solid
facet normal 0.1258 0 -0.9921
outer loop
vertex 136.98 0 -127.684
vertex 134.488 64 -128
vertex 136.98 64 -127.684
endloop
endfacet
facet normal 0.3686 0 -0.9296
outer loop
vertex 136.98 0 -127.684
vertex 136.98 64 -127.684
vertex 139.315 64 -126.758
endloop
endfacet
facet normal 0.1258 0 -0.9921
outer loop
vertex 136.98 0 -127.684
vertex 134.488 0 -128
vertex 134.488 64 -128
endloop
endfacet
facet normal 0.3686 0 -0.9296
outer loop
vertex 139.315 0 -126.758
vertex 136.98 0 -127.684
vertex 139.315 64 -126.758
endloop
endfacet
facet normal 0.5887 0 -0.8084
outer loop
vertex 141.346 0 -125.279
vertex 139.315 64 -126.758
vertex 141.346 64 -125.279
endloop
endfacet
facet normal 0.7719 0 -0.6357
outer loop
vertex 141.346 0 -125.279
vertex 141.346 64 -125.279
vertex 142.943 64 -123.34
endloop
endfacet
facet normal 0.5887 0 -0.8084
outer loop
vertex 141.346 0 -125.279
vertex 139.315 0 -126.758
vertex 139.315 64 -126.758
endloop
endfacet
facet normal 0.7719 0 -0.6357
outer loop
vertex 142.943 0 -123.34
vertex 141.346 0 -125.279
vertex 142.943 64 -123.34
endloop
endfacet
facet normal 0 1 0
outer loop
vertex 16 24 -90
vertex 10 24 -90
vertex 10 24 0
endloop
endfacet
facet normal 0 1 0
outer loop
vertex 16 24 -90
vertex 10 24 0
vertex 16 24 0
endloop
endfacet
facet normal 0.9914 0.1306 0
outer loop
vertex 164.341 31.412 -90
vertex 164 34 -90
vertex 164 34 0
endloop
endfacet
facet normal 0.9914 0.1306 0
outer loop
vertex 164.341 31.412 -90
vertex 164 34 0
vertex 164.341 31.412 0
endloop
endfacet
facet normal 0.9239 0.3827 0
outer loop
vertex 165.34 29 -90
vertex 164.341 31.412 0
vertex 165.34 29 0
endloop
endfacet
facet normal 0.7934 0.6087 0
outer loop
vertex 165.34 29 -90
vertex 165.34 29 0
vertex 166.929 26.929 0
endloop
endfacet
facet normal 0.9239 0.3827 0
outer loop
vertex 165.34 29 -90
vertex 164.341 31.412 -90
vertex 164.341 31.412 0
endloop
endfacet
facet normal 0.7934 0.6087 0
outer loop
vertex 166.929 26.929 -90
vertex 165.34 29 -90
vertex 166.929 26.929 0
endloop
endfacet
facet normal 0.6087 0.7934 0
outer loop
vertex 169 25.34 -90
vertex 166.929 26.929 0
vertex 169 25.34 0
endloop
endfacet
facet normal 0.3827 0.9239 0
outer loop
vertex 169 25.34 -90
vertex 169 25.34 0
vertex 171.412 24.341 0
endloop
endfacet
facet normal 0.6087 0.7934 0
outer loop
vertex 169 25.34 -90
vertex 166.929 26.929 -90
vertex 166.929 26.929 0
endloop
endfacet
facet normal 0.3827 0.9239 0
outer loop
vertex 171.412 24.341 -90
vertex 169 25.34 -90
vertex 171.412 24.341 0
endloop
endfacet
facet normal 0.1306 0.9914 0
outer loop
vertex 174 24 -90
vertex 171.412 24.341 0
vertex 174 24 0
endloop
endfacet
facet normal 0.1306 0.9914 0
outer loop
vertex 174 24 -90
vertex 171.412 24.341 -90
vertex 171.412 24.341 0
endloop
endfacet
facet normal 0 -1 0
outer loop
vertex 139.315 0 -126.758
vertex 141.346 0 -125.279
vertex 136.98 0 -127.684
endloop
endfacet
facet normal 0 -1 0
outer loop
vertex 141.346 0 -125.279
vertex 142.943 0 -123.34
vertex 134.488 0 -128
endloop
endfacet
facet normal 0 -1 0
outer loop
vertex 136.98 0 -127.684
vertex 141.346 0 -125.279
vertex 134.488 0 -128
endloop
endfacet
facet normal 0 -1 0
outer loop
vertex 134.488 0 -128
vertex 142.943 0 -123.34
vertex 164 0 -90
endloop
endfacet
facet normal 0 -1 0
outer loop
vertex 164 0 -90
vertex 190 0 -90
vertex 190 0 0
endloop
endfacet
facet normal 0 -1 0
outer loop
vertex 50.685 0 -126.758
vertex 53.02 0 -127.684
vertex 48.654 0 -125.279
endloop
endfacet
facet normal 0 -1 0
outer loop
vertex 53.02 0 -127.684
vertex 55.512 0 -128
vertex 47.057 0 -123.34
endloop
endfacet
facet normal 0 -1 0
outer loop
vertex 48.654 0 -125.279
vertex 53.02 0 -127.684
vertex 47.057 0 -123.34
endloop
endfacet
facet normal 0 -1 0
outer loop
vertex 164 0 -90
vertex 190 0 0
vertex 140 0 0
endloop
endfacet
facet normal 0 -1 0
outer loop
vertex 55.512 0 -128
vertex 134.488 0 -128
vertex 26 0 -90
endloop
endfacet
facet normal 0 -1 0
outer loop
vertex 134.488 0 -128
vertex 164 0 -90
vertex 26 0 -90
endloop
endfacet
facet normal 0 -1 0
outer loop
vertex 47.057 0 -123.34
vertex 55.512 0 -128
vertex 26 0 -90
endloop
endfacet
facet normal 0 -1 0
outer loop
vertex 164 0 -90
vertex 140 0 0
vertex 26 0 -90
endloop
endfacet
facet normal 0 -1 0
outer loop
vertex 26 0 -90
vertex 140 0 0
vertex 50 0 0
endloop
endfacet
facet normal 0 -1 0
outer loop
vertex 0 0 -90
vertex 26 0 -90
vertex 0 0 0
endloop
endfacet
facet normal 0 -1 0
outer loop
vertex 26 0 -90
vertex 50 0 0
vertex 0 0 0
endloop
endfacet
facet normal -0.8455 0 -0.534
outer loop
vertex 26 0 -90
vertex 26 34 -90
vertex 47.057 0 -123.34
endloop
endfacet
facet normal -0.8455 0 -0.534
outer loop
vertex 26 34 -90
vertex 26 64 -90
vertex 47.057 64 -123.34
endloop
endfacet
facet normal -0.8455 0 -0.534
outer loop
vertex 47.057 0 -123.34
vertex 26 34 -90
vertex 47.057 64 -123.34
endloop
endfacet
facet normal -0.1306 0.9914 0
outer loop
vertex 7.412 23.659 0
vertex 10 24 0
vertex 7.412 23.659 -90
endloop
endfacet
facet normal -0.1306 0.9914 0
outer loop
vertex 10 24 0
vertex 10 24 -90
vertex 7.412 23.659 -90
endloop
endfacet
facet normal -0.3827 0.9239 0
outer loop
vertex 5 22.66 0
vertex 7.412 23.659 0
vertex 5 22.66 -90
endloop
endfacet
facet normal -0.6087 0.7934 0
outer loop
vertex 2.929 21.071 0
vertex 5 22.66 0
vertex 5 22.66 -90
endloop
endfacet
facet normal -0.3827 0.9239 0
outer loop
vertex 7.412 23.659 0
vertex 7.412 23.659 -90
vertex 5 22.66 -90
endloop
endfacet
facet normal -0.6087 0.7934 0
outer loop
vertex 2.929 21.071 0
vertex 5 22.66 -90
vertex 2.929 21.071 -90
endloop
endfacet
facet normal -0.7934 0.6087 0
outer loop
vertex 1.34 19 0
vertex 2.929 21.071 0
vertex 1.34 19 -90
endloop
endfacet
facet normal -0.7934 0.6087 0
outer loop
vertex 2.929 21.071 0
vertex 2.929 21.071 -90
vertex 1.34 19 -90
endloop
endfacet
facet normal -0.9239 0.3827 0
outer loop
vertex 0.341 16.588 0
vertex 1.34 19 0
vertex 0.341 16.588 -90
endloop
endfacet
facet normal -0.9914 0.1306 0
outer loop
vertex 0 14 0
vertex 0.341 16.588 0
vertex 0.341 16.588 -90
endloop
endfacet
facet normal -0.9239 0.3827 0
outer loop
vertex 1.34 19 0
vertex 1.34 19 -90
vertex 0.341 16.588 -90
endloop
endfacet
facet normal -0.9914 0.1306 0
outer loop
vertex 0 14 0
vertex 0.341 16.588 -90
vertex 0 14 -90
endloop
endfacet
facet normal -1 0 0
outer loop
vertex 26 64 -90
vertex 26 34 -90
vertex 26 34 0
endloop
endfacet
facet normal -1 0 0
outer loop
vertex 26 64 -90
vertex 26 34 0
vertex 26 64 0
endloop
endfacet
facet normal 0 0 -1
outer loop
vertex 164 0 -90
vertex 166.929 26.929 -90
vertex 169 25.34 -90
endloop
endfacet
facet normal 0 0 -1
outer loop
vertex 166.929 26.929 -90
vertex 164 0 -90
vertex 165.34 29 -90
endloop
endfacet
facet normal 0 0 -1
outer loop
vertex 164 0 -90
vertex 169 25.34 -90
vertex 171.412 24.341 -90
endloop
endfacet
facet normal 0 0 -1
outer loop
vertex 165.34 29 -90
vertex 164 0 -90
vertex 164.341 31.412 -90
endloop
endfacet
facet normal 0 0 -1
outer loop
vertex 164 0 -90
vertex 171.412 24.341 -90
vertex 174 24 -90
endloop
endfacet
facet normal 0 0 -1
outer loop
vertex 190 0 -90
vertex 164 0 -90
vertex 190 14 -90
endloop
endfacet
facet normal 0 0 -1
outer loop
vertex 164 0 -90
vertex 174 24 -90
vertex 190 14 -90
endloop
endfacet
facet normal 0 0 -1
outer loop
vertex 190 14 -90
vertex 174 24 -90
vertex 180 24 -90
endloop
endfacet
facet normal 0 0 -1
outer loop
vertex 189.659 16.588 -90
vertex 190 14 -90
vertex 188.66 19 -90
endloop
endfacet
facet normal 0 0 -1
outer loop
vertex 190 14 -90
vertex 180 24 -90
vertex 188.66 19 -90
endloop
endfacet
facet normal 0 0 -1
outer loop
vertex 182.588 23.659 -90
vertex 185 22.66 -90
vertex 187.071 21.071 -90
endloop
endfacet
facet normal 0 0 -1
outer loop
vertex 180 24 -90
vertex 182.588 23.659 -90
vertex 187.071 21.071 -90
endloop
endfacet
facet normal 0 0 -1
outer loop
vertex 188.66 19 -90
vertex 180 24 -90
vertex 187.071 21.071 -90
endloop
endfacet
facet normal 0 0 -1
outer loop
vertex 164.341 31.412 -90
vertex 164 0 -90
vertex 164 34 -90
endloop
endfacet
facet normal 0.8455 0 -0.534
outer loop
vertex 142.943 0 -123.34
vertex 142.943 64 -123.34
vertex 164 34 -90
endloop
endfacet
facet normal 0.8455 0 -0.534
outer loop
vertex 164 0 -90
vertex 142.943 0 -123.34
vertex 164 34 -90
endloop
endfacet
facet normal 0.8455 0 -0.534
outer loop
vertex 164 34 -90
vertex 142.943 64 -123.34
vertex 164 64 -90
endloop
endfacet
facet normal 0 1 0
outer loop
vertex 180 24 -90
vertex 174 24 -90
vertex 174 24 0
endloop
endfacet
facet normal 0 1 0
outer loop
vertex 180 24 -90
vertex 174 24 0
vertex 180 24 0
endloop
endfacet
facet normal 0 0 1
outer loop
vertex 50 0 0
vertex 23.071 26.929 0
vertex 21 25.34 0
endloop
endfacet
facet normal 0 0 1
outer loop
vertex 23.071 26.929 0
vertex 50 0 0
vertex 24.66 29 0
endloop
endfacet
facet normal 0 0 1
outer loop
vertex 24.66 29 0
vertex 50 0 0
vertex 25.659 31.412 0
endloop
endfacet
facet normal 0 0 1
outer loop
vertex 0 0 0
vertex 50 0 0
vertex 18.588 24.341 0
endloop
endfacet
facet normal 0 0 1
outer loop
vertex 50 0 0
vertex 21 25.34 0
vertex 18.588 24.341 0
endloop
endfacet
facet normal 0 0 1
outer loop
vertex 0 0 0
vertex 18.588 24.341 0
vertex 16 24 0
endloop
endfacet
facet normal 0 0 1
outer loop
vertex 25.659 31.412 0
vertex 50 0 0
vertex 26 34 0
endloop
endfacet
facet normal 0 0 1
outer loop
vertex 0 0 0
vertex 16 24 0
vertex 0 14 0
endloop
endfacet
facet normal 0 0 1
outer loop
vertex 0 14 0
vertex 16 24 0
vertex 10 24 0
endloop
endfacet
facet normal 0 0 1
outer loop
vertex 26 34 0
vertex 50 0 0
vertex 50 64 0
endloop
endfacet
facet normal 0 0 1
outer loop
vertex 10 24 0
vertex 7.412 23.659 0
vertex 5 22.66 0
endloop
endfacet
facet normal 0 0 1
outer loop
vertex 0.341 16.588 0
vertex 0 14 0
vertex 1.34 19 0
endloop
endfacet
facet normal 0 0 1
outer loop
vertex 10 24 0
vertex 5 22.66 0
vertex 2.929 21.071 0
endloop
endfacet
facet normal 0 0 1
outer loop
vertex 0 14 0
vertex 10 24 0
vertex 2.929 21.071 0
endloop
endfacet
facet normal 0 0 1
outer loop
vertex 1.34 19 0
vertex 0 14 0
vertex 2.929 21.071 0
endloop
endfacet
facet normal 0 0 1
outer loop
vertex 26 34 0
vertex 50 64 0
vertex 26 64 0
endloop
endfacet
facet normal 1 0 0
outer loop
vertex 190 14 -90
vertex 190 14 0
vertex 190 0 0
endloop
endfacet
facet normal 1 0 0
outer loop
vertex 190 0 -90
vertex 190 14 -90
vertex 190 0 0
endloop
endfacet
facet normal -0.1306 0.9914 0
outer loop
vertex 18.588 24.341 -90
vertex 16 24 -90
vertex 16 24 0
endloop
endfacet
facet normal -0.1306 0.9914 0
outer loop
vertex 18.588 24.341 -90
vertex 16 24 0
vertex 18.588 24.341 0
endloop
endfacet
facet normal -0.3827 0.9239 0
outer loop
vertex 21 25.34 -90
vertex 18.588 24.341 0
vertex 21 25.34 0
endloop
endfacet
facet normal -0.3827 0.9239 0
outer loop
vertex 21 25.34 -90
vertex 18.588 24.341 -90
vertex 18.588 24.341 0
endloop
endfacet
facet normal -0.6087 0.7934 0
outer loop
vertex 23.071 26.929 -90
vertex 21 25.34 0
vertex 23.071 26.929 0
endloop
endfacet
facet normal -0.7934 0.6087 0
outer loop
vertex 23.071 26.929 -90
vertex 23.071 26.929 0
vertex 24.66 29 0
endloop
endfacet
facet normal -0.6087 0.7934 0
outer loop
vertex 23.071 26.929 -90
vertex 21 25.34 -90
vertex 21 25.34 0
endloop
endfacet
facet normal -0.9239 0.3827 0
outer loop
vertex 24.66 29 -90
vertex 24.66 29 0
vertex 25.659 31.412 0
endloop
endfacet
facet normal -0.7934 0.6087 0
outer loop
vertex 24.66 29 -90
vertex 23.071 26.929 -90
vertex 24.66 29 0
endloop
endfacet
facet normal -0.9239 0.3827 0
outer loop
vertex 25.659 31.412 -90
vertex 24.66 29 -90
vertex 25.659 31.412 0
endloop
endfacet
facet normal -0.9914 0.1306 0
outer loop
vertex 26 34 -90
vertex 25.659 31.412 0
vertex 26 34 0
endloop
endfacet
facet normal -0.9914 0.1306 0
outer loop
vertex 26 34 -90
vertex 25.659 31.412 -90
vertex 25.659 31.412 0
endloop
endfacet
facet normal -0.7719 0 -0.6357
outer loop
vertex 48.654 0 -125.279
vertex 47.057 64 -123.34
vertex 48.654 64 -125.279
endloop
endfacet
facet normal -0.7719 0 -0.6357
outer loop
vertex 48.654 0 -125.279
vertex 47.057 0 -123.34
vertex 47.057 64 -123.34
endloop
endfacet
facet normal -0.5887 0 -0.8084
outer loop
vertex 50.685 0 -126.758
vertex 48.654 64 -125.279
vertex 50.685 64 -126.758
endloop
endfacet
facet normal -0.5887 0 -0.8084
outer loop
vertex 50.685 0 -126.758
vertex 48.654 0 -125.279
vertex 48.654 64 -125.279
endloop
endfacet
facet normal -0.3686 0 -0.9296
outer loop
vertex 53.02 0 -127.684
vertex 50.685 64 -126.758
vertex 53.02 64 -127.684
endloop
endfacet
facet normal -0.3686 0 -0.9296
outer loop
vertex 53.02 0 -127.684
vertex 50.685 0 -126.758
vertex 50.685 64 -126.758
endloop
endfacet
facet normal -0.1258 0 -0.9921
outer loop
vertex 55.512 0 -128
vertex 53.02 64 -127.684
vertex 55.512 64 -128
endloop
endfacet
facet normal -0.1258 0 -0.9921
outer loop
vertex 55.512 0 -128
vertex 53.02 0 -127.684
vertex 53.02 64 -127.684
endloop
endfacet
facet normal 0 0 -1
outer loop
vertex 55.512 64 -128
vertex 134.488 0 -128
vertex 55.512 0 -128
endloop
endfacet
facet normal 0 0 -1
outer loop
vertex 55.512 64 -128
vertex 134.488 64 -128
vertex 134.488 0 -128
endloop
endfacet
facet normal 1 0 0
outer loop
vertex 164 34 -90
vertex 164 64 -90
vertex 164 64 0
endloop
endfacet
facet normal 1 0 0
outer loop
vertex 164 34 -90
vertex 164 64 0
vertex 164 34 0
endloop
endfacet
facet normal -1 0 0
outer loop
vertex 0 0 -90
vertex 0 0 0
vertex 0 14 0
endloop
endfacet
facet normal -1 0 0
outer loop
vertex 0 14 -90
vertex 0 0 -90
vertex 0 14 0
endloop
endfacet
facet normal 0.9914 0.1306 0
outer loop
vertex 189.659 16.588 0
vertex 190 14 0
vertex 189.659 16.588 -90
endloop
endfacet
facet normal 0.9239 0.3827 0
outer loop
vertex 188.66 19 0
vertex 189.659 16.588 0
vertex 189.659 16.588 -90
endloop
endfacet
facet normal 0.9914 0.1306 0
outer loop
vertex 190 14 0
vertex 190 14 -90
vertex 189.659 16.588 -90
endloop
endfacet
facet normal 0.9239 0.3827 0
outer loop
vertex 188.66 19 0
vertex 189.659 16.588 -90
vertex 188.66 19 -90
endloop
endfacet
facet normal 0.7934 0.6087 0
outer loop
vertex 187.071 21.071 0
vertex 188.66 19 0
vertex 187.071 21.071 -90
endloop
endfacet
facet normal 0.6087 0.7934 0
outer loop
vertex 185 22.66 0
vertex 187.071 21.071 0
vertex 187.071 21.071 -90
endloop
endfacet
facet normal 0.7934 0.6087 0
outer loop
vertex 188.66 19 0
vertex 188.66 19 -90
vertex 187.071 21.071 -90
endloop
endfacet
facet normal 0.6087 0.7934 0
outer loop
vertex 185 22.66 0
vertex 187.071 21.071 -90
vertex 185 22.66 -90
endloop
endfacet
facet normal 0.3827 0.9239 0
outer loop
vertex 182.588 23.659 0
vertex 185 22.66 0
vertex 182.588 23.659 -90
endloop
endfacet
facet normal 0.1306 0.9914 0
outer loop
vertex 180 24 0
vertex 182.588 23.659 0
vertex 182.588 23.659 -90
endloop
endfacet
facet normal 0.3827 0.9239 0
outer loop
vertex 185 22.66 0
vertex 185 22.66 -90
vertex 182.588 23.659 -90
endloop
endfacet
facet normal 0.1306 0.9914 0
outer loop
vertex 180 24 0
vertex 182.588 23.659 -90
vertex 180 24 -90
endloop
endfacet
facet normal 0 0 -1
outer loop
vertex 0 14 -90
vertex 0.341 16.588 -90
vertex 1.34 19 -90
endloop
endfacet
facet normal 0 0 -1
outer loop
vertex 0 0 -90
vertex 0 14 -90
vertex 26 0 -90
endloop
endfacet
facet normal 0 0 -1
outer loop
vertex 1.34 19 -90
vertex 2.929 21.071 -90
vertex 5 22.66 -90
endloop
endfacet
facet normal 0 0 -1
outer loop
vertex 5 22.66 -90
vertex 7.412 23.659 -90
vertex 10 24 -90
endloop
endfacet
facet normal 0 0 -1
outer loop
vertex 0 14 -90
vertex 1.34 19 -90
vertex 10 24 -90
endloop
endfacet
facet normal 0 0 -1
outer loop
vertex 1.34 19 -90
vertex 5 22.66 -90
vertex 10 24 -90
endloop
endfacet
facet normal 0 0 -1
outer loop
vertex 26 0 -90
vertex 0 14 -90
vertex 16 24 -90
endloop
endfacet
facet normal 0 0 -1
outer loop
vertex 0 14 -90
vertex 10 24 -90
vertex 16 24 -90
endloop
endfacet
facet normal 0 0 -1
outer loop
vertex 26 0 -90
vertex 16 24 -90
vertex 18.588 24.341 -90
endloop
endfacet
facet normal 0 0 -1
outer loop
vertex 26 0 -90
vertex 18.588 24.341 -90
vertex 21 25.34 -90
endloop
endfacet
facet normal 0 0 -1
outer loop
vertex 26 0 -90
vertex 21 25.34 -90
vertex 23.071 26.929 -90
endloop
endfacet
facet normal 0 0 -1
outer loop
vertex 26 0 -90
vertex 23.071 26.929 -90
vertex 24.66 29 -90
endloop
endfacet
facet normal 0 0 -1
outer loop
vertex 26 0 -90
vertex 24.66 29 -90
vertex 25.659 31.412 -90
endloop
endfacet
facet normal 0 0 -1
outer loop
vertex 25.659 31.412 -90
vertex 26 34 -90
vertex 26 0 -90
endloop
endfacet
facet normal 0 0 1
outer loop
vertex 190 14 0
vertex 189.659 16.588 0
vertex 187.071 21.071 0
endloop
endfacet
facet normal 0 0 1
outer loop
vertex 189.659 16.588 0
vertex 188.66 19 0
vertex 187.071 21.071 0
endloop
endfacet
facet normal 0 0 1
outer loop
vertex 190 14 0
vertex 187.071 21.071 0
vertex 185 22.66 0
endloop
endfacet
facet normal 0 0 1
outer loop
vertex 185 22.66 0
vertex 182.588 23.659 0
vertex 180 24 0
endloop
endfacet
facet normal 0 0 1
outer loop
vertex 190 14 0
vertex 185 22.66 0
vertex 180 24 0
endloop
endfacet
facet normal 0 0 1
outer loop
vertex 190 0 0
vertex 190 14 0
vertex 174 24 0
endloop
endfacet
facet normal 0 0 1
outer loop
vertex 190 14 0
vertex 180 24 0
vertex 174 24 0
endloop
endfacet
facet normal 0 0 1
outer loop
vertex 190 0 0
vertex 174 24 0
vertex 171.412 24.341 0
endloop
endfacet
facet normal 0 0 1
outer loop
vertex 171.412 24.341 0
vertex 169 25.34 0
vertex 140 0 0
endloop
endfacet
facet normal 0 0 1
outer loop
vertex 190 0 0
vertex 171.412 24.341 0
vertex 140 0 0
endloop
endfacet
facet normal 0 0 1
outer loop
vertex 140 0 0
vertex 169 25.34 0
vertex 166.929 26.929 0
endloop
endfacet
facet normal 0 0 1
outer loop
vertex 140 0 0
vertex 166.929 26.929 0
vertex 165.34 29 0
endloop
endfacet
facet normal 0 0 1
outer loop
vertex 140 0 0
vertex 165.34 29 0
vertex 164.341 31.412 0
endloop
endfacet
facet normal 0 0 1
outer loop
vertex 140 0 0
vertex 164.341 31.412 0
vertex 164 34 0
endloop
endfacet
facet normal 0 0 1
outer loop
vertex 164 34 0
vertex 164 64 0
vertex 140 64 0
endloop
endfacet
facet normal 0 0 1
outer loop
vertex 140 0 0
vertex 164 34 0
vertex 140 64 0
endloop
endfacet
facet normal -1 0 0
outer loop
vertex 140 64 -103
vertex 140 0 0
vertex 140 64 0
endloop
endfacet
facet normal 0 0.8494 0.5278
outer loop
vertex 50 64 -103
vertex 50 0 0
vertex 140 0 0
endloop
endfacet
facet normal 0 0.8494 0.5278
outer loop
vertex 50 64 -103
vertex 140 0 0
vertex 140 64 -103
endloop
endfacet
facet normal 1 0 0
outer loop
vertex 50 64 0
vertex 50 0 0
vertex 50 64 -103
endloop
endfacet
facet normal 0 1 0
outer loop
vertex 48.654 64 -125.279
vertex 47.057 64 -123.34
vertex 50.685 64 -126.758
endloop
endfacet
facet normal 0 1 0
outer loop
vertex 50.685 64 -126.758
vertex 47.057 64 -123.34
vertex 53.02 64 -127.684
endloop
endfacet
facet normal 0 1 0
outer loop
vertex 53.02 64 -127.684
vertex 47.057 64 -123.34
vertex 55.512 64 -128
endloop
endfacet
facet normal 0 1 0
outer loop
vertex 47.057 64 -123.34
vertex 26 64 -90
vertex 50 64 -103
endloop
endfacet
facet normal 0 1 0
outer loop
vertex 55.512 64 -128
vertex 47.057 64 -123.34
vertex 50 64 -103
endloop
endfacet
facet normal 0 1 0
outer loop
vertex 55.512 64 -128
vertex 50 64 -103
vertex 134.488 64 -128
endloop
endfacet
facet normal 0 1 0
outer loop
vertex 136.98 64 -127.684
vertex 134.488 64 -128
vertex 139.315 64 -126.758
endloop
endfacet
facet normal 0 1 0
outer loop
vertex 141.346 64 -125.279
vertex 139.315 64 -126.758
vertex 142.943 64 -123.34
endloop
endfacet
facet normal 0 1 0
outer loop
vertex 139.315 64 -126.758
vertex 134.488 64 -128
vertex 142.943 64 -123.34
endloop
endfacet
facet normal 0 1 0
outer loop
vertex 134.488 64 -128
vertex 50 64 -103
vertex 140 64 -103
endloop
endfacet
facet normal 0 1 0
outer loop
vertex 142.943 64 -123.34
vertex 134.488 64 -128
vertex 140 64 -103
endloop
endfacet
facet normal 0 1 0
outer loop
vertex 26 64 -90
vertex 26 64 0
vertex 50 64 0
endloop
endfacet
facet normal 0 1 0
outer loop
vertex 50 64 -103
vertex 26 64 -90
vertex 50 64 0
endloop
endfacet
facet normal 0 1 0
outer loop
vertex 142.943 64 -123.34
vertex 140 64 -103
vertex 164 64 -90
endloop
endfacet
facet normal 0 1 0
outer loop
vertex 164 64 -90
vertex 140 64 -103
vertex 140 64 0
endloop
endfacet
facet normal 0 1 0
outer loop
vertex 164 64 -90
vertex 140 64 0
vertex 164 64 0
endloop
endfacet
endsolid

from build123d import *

# Parameters (mm, degrees)
BOSS_EXTRUDE1_DEPTH = 128
CUT_EXTRUDE1_DEPTH  = 238.865508218
CUT_EXTRUDE2_START  = 50
CUT_EXTRUDE2_DEPTH  = 90
FILLET1_R           = 10


# Read off the part's stored shape, not the designer's step: Cut-Extrude2
with BuildPart() as part:
    # Sketch1 → Boss-Extrude1 (new body)
    with BuildSketch(Plane.XY):
        Polygon((0, 24), (26, 24), (26, 64), (164, 64), (164, 24), (190, 24), (190, 0), (0, 0), align=None)
    extrude(amount=-BOSS_EXTRUDE1_DEPTH)

    # Sketch5 → Cut-Extrude1 (cut, through all)
    with BuildSketch(Plane(origin=(0, 64, 0), x_dir=(1, 0, 0), z_dir=(0, 1, 0))):
        Polygon((0, 90), (26, 90), (50, 128), (0, 128), align=None)
        Polygon((164, 90), (190, 90), (190, 128), (140, 128), align=None)
    extrude(amount=-CUT_EXTRUDE1_DEPTH, mode=Mode.SUBTRACT)

    # Cut-Extrude2 outline → Cut-Extrude2 (cut)
    with BuildSketch(Plane.YZ.offset(CUT_EXTRUDE2_START)):
        Polygon((0, 0), (64, -103), (64, 0), align=None)
    extrude(amount=CUT_EXTRUDE2_DEPTH, mode=Mode.SUBTRACT)

    # Fillet1
    fillet1_edges = [part.edges().sort_by_distance(p)[0] for p in [
        (26, 24, -45),
        (0, 24, -45),
        (190, 24, -45),
        (164, 24, -45),
        (50, 32, -128),
        (140, 32, -128),
    ]]
    fillet(fillet1_edges, radius=FILLET1_R)


solid = part.part
